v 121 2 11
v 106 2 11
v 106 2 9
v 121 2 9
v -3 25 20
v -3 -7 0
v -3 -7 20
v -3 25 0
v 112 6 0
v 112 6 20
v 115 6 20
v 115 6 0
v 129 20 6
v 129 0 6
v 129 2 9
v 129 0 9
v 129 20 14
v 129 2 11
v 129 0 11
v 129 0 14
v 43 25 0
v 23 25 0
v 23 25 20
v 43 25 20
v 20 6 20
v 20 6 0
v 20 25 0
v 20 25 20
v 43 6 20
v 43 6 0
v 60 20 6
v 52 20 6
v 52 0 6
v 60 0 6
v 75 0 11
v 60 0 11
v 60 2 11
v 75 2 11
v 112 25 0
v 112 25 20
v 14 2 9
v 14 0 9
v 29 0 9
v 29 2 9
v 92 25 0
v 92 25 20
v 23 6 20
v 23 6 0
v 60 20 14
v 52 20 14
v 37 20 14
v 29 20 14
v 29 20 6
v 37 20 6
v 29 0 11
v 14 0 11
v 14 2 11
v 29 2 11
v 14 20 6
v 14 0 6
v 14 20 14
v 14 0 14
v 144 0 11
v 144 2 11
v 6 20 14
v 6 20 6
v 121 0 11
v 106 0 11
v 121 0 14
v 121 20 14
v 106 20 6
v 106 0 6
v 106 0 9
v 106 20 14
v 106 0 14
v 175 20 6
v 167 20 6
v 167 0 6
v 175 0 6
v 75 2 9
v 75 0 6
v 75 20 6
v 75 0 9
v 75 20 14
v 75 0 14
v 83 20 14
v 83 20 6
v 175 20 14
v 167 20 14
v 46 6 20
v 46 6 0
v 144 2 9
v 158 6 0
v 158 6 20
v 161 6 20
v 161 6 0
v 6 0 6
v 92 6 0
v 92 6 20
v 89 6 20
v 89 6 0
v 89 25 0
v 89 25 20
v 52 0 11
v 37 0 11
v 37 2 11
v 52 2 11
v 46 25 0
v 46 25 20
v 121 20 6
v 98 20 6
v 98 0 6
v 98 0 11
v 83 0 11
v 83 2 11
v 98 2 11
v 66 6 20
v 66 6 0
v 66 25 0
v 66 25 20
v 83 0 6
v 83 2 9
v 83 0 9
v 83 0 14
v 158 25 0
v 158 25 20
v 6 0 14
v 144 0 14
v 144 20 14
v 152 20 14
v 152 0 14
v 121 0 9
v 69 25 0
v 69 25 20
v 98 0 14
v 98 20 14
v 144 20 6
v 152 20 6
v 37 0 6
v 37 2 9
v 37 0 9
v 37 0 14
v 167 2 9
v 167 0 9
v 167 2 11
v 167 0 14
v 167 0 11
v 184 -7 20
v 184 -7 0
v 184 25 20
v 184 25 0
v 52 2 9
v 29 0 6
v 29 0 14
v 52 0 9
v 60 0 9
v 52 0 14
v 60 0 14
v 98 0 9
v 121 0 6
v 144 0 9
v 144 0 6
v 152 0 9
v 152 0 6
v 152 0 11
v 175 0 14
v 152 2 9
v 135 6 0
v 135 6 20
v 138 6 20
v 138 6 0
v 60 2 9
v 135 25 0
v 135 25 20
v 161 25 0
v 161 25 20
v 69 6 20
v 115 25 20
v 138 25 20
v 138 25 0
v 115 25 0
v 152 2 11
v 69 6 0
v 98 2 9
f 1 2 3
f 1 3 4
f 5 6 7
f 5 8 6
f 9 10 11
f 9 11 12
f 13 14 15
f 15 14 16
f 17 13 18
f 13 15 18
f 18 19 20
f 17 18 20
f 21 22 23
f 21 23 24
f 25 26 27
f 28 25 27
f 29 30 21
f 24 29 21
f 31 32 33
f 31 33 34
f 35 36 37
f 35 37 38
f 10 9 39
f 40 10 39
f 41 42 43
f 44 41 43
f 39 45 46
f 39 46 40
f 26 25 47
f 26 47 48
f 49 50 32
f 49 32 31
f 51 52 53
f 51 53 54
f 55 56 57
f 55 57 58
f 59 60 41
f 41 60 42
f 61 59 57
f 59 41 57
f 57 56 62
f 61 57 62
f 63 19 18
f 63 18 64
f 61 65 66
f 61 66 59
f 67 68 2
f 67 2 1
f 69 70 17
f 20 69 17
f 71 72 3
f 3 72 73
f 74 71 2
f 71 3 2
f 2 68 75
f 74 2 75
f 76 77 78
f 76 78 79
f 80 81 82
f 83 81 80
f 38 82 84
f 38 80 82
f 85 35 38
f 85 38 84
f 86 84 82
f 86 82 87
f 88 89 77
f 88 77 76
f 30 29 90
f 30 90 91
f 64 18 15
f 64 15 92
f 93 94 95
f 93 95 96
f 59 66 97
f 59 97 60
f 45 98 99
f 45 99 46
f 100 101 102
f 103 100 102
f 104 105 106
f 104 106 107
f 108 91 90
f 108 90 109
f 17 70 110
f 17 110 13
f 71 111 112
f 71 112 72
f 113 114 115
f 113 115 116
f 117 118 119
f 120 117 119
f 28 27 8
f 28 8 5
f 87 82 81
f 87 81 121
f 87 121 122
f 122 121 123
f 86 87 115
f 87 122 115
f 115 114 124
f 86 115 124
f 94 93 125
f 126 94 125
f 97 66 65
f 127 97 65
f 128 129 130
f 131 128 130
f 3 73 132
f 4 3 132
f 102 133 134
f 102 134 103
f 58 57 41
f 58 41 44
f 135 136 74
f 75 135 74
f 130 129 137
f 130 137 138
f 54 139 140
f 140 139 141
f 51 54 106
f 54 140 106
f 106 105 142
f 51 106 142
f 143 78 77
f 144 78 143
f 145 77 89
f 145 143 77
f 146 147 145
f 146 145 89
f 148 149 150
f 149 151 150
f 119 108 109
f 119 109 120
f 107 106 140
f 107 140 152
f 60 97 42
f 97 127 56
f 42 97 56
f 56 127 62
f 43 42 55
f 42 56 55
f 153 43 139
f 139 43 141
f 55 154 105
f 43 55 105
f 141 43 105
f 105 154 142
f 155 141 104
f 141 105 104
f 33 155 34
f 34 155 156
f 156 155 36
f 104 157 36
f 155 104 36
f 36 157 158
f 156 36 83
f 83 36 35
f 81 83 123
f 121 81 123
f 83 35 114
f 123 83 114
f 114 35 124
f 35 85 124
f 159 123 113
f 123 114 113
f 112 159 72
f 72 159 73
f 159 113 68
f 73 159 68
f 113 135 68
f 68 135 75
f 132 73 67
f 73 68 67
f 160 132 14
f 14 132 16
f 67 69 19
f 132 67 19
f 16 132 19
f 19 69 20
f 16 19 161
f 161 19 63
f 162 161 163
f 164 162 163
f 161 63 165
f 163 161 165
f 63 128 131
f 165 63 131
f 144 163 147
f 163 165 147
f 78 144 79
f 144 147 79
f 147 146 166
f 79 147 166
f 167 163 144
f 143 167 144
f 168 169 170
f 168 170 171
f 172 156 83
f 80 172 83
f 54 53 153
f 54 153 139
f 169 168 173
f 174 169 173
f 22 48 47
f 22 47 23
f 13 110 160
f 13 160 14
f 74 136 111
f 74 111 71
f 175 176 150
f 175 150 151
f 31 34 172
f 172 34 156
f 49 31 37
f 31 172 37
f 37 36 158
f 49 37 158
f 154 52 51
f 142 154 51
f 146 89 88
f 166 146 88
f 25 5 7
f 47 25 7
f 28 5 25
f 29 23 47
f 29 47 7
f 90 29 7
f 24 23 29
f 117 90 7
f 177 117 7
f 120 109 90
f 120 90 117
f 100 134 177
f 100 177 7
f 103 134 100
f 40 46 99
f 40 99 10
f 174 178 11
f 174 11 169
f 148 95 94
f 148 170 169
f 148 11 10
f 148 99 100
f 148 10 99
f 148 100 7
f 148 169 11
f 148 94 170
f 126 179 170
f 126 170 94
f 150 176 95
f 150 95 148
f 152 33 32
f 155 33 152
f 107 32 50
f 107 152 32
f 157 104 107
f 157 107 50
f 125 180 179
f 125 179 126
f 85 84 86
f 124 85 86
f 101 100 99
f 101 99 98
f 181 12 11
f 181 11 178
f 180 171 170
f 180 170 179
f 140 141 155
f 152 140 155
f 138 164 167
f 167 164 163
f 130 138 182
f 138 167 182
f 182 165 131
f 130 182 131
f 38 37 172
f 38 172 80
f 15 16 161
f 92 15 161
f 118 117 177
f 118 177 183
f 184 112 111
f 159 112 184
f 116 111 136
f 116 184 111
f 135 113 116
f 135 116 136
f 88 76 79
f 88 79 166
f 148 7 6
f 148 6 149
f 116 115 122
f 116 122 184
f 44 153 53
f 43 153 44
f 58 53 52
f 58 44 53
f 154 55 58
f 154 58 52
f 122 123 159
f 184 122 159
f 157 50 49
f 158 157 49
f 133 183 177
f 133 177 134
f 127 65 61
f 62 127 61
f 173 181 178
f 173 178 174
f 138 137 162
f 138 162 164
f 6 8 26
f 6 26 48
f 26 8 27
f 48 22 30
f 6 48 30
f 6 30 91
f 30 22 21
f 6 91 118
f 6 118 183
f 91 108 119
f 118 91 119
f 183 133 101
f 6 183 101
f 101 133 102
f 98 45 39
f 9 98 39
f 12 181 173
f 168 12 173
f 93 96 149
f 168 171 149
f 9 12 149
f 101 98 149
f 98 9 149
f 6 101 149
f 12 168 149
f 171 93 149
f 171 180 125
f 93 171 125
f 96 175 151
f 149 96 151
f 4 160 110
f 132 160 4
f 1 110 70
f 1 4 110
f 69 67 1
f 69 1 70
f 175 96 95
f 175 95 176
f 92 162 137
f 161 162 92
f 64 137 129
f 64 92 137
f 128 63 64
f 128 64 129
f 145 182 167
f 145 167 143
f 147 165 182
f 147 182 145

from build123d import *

# Parameters (mm, degrees)
SKETCH1_W           = 20
SKETCH1_H           = 25
BOSS_EXTRUDE1_DEPTH = 20
SKETCH2_W           = 8
SKETCH2_H           = 8
CUT_EXTRUDE1_DEPTH  = 20
SKETCH3_W           = 20
SKETCH3_H           = 6
BOSS_EXTRUDE2_DEPTH = 3
LPATTERN1_COUNT     = 8
LPATTERN1_PITCH     = 23
SKETCH4_W           = 20
SKETCH4_H           = 19
BOSS_EXTRUDE3_DEPTH = 3
SKETCH5_W           = 20
SKETCH5_H           = 25
BOSS_EXTRUDE4_DEPTH = 3
SKETCH6_W           = 153
SKETCH6_H           = 2
CUT_EXTRUDE2_DEPTH  = 2
SKETCH7_W           = 187
SKETCH7_H           = 20
BOSS_EXTRUDE5_DEPTH = 7


with BuildPart() as part:
    # Sketch1 → Boss-Extrude1 (new body)
    with BuildSketch(Plane.XY):
        with Locations((10, 12.5)):
            Rectangle(SKETCH1_W, SKETCH1_H)
    extrude(amount=BOSS_EXTRUDE1_DEPTH)

    # Sketch2 → Cut-Extrude1 (cut)
    with BuildSketch(Plane.XZ):
        with Locations((10, 10)):
            Rectangle(SKETCH2_W, SKETCH2_H)
    extrude(amount=-CUT_EXTRUDE1_DEPTH, mode=Mode.SUBTRACT)

    # Sketch3 → Boss-Extrude2 (add)
    with BuildSketch(Plane(origin=(20, 0, 0), x_dir=(0, 0, -1), z_dir=(1, 0, 0))):
        with Locations((-10, 3)):
            Rectangle(SKETCH3_W, SKETCH3_H)
    extrude(amount=BOSS_EXTRUDE2_DEPTH)


with BuildPart() as lpattern1_1:
    # LPattern1: pattern copy
    add(part.part.moved(Location(Vector(1, 0, 0) * (1 * LPATTERN1_PITCH))))


with BuildPart() as lpattern1_2:
    # LPattern1: pattern copy
    add(part.part.moved(Location(Vector(1, 0, 0) * (2 * LPATTERN1_PITCH))))


with BuildPart() as lpattern1_3:
    # LPattern1: pattern copy
    add(part.part.moved(Location(Vector(1, 0, 0) * (3 * LPATTERN1_PITCH))))


with BuildPart() as lpattern1_4:
    # LPattern1: pattern copy
    add(part.part.moved(Location(Vector(1, 0, 0) * (4 * LPATTERN1_PITCH))))


with BuildPart() as lpattern1_5:
    # LPattern1: pattern copy
    add(part.part.moved(Location(Vector(1, 0, 0) * (5 * LPATTERN1_PITCH))))


with BuildPart() as lpattern1_6:
    # LPattern1: pattern copy
    add(part.part.moved(Location(Vector(1, 0, 0) * (6 * LPATTERN1_PITCH))))


with BuildPart() as lpattern1_7:
    # LPattern1: pattern copy
    add(part.part.moved(Location(Vector(1, 0, 0) * (7 * LPATTERN1_PITCH))))


with BuildPart() as lpattern1_1_1:
    add(lpattern1_1.part)

    # Combine1: union LPattern1_2, LPattern1_3, part, LPattern1_4, LPattern1_5, LPattern1_6, LPattern1_7
    add(lpattern1_2.part)
    add(lpattern1_3.part)
    add(part.part)
    add(lpattern1_4.part)
    add(lpattern1_5.part)
    add(lpattern1_6.part)
    add(lpattern1_7.part)

    # Sketch4 → Boss-Extrude3 (add)
    with BuildSketch(Plane(origin=(181, 0, 0), x_dir=(0, 0, -1), z_dir=(1, 0, 0))):
        with Locations((-10, 15.5)):
            Rectangle(SKETCH4_W, SKETCH4_H)
    extrude(amount=BOSS_EXTRUDE3_DEPTH)

    # Sketch5 → Boss-Extrude4 (add)
    with BuildSketch(Plane.ZY):
        with Locations((10, 12.5)):
            Rectangle(SKETCH5_W, SKETCH5_H)
    extrude(amount=BOSS_EXTRUDE4_DEPTH)

    # Sketch6 → Cut-Extrude2 (cut)
    with BuildSketch(Plane.XZ):
        with Locations((90.5, 10)):
            Rectangle(SKETCH6_W, SKETCH6_H)
    extrude(amount=-CUT_EXTRUDE2_DEPTH, mode=Mode.SUBTRACT)

    # Sketch7 → Boss-Extrude5 (add)
    with BuildSketch(Plane.XZ):
        with Locations((90.5, 10)):
            Rectangle(SKETCH7_W, SKETCH7_H)
    extrude(amount=BOSS_EXTRUDE5_DEPTH)


solid = lpattern1_1_1.part
